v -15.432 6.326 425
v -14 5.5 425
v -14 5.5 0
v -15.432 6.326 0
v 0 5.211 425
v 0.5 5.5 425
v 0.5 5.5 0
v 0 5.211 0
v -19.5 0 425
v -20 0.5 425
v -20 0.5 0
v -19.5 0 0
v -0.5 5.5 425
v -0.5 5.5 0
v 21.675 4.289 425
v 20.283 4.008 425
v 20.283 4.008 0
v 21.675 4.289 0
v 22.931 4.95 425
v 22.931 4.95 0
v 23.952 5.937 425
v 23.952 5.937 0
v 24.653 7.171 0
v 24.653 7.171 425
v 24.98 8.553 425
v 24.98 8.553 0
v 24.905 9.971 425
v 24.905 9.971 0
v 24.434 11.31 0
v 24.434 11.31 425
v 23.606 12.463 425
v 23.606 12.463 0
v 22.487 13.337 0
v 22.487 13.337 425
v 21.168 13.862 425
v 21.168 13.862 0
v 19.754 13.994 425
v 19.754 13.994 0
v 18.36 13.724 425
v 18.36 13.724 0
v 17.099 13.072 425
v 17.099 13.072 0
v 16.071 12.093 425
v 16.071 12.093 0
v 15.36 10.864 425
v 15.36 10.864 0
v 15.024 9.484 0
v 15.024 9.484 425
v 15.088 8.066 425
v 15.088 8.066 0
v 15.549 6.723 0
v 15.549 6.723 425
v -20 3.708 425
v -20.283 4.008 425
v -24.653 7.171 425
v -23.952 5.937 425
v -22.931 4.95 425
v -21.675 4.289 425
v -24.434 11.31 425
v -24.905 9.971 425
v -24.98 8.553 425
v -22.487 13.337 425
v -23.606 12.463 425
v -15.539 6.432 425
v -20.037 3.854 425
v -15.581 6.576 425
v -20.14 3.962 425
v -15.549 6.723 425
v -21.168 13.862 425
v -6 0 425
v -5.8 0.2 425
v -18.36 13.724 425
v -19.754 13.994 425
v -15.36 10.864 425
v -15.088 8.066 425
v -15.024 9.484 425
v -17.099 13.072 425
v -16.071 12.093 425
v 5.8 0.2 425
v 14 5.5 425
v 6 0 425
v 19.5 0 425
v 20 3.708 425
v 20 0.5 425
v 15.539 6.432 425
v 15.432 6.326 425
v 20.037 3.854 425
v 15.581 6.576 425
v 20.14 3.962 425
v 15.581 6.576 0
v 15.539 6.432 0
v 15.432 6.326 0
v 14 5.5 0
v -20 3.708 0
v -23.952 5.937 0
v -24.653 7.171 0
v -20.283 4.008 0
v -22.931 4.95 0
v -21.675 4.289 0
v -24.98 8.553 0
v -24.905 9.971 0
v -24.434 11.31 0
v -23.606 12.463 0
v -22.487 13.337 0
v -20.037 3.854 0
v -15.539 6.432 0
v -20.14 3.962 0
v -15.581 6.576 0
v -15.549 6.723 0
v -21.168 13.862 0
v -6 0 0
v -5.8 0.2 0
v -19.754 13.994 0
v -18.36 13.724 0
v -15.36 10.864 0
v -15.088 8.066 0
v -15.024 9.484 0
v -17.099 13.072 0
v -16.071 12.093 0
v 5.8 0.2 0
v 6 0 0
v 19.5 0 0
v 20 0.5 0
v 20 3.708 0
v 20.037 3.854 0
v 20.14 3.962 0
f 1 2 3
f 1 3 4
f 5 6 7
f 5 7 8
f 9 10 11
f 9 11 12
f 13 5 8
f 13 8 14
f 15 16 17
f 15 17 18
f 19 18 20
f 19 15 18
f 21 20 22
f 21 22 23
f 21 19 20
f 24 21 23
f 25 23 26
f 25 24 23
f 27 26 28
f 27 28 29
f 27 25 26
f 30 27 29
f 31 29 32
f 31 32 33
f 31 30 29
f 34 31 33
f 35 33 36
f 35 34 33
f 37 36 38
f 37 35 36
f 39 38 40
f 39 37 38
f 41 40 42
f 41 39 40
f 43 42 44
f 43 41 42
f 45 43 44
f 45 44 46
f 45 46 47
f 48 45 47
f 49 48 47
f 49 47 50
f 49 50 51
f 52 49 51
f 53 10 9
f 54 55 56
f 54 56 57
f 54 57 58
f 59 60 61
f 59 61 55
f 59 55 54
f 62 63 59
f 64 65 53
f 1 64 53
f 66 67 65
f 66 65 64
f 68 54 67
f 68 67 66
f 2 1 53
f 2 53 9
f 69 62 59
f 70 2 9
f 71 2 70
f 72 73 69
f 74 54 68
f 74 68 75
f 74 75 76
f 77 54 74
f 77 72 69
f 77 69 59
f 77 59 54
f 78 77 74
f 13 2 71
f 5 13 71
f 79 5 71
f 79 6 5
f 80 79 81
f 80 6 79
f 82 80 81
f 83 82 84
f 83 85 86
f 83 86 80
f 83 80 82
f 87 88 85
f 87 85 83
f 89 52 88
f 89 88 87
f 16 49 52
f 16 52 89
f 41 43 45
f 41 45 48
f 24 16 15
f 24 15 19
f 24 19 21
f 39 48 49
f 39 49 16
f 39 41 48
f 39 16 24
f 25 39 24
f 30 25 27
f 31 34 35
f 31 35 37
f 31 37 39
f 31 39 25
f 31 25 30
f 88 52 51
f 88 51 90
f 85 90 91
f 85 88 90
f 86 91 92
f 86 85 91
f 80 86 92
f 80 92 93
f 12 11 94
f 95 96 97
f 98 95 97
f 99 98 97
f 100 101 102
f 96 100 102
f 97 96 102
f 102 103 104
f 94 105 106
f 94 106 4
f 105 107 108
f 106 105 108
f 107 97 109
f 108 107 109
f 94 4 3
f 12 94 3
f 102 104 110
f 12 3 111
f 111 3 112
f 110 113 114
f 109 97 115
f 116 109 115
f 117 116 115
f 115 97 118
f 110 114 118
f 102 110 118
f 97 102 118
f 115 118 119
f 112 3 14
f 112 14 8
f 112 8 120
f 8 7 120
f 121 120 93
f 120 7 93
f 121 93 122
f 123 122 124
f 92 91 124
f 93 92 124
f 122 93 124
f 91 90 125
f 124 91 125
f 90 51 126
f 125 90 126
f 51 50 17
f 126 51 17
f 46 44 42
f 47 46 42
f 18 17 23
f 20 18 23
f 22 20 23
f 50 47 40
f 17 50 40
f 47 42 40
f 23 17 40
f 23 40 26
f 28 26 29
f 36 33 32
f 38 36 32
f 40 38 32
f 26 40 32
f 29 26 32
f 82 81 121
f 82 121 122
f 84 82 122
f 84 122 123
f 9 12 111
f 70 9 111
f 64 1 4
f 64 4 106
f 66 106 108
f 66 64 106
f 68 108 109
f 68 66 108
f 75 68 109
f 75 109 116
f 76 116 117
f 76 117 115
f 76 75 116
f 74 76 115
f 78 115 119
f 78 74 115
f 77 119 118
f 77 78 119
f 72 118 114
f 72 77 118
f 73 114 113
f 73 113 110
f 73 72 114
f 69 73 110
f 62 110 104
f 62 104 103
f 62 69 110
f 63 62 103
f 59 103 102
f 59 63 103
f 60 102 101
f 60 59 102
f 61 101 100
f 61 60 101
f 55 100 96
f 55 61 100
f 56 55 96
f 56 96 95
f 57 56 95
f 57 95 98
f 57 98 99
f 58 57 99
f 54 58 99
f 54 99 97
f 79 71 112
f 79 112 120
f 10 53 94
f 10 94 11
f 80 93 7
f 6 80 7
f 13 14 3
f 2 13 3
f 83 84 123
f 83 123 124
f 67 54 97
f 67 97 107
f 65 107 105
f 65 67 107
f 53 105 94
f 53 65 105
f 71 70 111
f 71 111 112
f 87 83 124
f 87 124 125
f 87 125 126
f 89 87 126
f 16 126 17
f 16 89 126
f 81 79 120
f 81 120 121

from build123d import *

# Parameters (mm, degrees)
BOSS_EXTRUDE1_DEPTH = 425


with BuildPart() as part:
    # Sketch1 → Boss-Extrude1 (new body)
    with BuildSketch(Plane.XY.offset(425)):
        with BuildLine():
            Line((-20, 0.5), (-19.5, 0))
            Line((-19.5, 0), (-6, 0))
            Line((-6, 0), (-5.8, 0.2))
            Line((-5.8, 0.2), (5.8, 0.2))
            Line((5.8, 0.2), (6, 0))
            Line((6, 0), (19.5, 0))
            Line((19.5, 0), (20, 0.5))
            Line((20, 0.5), (20, 3.708496771))
            ThreePointArc((20, 3.708496771), (20.081946856, 3.914537598), (20.283018838, 4.008015763))
            ThreePointArc((20.283018838, 4.008015763), (22.487270957, 13.337451356), (15.548604796, 6.722921305))
            ThreePointArc((15.548604796, 6.722921305), (15.569235136, 6.501321924), (15.431520983, 6.326488551))
            Line((15.431520983, 6.326488551), (13.999999829, 5.499999462))
            Line((13.999999829, 5.499999462), (0.499999829, 5.499999462))
            Line((0.499999829, 5.499999462), (-1.71e-07, 5.211324462))
            Line((-1.71e-07, 5.211324462), (-0.500000171, 5.499999462))
            Line((-0.500000171, 5.499999462), (-14.000000171, 5.499999462))
            Line((-14.000000171, 5.499999462), (-15.431521324, 6.326488551))
            ThreePointArc((-15.431521324, 6.326488551), (-15.569235521, 6.501321979), (-15.548605174, 6.72292143))
            ThreePointArc((-15.548605174, 6.72292143), (-22.487271055, 13.33745115), (-20.283018868, 4.008016016))
            ThreePointArc((-20.283018868, 4.008016016), (-20.081946865, 3.914537846), (-20, 3.708497))
            Line((-20, 3.708497), (-20, 0.5))
        make_face()
    extrude(amount=-BOSS_EXTRUDE1_DEPTH)


solid = part.part
